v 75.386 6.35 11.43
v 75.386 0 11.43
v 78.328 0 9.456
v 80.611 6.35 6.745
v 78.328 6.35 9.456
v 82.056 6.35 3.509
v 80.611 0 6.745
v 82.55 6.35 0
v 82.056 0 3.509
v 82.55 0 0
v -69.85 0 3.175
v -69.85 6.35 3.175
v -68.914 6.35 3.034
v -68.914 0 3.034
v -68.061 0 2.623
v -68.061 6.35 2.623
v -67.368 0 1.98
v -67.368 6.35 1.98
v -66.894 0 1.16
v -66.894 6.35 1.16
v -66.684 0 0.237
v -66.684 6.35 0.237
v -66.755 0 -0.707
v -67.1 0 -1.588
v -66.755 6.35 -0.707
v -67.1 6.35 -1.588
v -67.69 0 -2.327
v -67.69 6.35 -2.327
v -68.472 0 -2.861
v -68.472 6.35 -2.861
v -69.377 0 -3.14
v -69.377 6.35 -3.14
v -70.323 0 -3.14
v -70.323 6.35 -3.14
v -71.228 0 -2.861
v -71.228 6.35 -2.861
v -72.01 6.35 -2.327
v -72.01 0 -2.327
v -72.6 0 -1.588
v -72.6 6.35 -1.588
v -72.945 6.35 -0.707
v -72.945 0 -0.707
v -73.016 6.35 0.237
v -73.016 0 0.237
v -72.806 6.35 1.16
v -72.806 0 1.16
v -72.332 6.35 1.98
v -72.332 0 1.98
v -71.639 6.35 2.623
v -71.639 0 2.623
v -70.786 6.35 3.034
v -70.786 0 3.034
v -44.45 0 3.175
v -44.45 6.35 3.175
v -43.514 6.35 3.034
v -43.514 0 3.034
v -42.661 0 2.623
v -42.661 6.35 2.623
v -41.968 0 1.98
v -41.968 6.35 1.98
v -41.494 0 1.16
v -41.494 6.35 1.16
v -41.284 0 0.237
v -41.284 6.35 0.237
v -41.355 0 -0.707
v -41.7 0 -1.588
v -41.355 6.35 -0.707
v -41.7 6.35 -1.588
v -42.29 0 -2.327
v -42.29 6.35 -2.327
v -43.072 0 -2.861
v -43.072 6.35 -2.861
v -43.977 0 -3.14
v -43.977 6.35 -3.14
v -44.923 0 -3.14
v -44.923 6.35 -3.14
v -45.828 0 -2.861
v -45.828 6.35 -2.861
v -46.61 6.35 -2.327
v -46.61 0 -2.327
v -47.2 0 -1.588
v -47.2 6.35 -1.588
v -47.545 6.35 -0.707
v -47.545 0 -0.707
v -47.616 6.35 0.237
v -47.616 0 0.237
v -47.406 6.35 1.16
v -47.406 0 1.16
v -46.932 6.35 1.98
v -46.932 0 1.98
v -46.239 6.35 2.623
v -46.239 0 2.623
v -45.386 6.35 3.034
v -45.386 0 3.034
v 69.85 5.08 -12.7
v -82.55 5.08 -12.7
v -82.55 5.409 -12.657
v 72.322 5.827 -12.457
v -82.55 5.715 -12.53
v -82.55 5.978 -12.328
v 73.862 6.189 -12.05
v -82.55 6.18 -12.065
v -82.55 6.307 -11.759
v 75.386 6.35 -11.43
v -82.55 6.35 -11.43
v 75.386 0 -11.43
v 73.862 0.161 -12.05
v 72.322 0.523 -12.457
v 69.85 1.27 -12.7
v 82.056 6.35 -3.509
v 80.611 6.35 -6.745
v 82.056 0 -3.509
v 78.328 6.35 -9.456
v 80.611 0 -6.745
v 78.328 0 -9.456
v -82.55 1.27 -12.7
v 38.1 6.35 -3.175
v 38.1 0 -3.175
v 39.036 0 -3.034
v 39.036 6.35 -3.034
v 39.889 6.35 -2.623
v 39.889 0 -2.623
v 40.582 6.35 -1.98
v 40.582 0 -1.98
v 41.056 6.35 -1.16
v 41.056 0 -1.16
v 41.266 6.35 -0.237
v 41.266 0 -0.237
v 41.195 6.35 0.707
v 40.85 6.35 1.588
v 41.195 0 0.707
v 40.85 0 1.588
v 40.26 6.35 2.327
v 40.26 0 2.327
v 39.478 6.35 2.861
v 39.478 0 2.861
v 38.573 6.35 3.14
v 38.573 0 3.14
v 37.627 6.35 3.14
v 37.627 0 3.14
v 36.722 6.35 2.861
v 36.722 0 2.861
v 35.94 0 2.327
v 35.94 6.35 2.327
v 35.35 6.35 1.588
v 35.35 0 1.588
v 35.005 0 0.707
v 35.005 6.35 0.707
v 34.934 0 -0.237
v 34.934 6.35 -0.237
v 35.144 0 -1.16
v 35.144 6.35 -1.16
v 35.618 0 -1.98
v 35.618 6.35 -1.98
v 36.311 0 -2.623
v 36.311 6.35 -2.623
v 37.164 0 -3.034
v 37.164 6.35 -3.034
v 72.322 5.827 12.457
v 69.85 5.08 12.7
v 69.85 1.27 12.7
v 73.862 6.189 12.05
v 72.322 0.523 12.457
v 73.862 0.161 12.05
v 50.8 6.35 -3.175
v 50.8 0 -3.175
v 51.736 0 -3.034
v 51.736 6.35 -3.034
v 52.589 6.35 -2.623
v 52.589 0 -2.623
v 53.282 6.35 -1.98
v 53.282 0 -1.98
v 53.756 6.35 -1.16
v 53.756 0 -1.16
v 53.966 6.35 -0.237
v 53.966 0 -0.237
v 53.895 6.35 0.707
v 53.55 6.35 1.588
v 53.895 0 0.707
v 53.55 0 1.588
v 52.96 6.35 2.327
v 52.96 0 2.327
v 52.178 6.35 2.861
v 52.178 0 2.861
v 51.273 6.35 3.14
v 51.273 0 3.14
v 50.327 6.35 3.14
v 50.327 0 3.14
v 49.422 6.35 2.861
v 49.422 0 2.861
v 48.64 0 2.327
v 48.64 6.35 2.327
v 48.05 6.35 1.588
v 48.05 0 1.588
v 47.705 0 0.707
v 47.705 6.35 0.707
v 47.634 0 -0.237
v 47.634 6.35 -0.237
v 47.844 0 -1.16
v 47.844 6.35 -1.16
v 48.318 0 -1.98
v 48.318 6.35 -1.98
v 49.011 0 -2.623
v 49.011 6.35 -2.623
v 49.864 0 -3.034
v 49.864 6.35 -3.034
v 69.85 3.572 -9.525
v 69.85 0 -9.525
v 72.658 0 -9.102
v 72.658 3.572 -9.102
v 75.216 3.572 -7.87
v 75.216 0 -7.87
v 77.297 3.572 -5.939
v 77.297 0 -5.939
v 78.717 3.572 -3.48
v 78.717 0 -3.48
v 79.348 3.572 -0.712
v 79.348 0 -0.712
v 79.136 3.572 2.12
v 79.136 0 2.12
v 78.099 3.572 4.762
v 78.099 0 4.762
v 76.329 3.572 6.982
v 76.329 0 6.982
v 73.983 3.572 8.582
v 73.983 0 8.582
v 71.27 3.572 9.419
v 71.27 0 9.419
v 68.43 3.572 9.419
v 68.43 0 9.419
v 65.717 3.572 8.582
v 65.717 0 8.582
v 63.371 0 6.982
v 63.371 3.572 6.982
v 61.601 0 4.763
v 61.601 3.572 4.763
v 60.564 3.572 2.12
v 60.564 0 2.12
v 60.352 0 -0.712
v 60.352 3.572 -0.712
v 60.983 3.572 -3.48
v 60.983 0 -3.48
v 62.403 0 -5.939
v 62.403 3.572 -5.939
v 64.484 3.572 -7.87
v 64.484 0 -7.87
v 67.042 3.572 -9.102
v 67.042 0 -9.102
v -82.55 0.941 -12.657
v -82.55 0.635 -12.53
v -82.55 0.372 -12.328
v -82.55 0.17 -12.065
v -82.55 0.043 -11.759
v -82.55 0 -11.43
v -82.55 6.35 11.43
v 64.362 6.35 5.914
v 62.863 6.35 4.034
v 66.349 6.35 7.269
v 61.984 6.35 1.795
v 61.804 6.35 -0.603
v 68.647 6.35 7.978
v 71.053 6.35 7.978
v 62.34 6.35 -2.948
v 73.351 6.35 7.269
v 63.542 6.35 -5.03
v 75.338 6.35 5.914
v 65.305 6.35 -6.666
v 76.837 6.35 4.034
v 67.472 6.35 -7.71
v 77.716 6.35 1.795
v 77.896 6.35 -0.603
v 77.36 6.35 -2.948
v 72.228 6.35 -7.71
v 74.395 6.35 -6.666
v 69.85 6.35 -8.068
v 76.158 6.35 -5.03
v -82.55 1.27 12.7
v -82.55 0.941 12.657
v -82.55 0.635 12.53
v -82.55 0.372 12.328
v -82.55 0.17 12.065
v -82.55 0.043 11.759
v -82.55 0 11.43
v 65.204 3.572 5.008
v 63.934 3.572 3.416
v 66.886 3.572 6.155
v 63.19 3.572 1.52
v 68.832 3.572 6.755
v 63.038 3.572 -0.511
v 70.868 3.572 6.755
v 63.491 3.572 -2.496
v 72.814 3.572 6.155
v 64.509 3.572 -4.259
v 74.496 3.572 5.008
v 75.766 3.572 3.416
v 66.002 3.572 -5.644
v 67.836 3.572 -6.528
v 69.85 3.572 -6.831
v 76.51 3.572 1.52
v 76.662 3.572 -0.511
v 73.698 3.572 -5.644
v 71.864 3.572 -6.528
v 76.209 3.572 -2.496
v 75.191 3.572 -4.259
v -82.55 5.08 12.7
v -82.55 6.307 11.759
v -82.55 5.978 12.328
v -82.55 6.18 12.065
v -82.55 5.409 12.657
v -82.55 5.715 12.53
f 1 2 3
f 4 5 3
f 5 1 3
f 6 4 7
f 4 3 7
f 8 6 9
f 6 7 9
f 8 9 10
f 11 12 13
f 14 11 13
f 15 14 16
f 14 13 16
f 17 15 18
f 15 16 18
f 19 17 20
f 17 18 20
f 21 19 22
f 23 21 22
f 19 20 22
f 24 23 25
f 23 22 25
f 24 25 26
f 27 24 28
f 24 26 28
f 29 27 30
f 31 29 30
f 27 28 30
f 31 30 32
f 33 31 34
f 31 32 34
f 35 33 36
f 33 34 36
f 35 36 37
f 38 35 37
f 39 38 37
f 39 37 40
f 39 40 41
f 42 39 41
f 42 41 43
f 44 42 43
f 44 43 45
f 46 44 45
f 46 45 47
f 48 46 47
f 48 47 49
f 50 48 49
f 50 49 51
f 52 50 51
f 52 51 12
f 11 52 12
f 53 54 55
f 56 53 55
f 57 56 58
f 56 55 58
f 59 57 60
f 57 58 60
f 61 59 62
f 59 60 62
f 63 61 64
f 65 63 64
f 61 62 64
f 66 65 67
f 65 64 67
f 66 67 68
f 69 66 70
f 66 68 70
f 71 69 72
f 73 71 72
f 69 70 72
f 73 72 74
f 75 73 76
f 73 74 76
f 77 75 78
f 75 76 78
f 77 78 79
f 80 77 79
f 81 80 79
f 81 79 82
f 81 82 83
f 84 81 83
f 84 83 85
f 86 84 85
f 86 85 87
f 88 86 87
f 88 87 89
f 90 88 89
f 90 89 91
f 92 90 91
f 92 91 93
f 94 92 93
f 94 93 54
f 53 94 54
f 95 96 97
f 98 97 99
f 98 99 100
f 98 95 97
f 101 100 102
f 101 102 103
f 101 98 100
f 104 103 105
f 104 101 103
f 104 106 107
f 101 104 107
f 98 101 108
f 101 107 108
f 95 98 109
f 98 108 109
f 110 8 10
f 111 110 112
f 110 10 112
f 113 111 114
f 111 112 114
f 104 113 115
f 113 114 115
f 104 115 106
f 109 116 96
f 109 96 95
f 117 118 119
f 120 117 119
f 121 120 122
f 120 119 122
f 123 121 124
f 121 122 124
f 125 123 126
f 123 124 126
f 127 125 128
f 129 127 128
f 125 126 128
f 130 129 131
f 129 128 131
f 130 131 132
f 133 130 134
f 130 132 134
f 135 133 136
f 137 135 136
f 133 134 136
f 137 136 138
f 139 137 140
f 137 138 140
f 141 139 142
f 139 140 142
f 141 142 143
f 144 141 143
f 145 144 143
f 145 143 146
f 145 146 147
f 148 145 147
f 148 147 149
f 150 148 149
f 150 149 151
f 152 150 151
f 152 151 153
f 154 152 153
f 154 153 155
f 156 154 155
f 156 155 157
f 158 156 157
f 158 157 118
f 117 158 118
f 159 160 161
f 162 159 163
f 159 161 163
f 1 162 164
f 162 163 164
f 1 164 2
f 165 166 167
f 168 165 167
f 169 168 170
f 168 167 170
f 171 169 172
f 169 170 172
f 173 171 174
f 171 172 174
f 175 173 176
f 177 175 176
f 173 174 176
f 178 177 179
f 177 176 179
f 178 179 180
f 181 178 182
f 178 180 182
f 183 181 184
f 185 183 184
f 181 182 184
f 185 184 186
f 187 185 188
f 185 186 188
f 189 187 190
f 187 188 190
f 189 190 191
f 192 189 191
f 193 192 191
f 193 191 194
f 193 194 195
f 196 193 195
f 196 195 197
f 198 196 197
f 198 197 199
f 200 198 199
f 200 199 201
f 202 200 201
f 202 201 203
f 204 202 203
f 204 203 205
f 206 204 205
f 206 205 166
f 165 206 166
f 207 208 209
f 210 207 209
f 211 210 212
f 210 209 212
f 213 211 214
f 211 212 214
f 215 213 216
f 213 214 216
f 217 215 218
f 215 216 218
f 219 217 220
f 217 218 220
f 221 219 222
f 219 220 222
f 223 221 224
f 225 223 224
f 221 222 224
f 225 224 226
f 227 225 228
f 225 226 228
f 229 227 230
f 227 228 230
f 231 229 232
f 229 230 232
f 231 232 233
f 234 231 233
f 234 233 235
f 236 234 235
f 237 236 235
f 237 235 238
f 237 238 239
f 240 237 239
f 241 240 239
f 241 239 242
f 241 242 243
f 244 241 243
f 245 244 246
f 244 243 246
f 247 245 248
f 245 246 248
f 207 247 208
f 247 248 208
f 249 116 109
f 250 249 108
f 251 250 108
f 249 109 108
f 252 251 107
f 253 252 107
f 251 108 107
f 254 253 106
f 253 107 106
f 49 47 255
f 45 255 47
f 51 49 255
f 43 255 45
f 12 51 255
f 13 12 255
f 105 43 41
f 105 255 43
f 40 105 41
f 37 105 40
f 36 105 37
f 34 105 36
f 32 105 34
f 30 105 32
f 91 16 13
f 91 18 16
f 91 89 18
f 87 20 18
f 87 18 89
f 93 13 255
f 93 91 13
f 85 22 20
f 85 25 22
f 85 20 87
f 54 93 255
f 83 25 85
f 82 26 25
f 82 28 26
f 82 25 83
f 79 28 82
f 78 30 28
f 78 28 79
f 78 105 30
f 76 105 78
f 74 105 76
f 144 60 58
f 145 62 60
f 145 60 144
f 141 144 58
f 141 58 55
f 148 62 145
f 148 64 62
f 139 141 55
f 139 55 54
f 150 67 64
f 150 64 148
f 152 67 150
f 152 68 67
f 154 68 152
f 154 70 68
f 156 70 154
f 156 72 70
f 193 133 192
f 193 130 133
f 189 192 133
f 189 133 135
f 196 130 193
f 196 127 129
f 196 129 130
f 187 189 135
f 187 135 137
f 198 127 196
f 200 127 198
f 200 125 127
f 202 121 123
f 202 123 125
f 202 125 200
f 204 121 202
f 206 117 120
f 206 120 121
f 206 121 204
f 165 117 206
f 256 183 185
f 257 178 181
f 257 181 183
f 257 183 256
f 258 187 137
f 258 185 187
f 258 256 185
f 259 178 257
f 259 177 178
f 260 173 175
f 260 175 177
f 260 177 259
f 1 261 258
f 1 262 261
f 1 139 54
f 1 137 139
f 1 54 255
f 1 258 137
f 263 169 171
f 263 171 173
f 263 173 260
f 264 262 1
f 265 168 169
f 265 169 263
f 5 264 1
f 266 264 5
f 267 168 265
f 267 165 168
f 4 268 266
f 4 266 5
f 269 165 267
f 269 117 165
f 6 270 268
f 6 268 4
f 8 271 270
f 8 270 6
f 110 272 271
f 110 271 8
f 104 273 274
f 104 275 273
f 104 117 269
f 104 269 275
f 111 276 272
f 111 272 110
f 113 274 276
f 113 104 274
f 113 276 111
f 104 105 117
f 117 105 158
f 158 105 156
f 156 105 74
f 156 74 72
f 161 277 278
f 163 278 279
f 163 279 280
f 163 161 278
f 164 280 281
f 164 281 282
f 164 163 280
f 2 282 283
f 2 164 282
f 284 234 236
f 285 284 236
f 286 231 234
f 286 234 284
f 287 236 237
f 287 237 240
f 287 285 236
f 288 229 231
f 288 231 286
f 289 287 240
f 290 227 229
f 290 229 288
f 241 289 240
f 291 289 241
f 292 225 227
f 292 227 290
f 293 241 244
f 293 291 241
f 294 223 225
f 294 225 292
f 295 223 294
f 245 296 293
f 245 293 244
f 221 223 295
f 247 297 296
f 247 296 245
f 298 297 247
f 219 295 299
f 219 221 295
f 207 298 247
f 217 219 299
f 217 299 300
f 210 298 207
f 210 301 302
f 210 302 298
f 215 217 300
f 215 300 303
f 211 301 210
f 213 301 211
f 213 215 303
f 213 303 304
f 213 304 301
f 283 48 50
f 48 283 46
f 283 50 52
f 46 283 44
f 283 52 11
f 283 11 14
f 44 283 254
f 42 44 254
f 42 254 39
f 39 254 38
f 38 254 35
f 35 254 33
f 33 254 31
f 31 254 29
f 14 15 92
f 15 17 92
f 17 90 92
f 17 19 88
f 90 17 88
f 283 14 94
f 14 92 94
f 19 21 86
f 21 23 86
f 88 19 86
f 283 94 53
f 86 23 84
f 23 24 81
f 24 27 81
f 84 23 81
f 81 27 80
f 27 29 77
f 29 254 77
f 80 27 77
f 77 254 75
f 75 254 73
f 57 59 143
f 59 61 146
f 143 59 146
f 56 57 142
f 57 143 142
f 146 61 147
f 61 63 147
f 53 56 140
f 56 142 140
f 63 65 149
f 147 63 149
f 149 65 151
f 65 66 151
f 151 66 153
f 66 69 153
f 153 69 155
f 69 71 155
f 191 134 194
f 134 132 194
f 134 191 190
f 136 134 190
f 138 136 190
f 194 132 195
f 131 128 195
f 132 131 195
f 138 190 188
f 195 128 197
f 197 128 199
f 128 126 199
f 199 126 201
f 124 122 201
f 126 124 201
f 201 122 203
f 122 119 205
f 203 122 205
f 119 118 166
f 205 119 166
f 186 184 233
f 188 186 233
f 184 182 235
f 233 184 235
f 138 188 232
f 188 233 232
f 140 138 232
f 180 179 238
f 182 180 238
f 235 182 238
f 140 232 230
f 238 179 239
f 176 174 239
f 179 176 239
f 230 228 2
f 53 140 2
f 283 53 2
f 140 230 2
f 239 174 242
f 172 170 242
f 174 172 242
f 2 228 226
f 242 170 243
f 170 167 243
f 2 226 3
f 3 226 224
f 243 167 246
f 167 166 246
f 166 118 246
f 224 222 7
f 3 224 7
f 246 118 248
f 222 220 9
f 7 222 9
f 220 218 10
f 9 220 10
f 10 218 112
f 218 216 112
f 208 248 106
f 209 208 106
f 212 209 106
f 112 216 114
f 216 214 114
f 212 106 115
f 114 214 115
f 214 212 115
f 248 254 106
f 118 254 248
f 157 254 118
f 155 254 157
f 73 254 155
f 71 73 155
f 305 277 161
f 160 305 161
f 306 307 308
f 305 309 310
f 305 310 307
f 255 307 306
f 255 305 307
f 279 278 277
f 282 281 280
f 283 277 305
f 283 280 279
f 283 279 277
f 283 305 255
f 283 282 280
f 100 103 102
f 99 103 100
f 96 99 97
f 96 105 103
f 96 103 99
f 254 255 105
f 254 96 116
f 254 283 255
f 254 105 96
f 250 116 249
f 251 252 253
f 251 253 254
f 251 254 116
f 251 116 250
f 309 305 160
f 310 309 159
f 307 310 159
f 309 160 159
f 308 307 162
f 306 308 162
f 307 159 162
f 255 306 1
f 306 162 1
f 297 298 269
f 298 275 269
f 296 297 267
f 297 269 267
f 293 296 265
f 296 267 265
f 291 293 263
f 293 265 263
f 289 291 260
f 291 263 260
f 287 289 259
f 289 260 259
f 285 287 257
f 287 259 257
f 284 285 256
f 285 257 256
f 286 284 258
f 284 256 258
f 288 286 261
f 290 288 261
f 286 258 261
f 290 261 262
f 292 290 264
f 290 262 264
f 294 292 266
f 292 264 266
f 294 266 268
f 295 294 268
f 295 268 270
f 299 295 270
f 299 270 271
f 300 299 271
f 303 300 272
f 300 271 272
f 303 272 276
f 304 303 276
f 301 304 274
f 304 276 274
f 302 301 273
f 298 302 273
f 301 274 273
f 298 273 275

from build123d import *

# Parameters (mm, degrees)
SKETCH1_W           = 165.1
SKETCH1_H           = 25.4
BOSS_EXTRUDE1_DEPTH = 6.35
FILLET1_R           = 1.27
SKETCH2_R           = 3.175
SKETCH2_R_2         = 6.35
CUT_EXTRUDE1_DEPTH  = 84.762252835
SKETCH3_R           = 9.525
CUT_EXTRUDE2_DEPTH  = 3.571875
CUT_EXTRUDE3_DEPTH  = 84.762252835
SKETCH5_R           = 3.175
CUT_EXTRUDE4_DEPTH  = 84.762252956


with BuildPart() as part:
    # Sketch1 → Boss-Extrude1 (new body)
    with BuildSketch(Plane(origin=(0, 0, 0), x_dir=(1, 0, 0), z_dir=(0, 1, 0))):
        Rectangle(SKETCH1_W, SKETCH1_H)
    extrude(amount=BOSS_EXTRUDE1_DEPTH)

    # Fillet1
    fillet1_edges = [part.edges().sort_by_distance(p)[0] for p in [
        (0, 0, -12.7),
        (0, 6.35, -12.7),
        (0, 0, 12.7),
        (0, 6.35, 12.7),
    ]]
    fillet(fillet1_edges, radius=FILLET1_R)

    # Sketch2 → Cut-Extrude1 (cut, through all)
    with BuildSketch(Plane(origin=(0, 6.35, 0), x_dir=(1, 0, 0), z_dir=(0, 1, 0))):
        with Locations((-69.85, 0)):
            Circle(SKETCH2_R)
        with Locations((69.85, 0)):
            Circle(SKETCH2_R_2)
        with Locations((-44.45, 0)):
            Circle(SKETCH2_R)
    extrude(amount=-CUT_EXTRUDE1_DEPTH, mode=Mode.SUBTRACT)

    # Sketch3 → Cut-Extrude2 (cut)
    with BuildSketch(Plane.XZ):
        with Locations((69.85, 0)):
            Circle(SKETCH3_R)
    extrude(amount=-CUT_EXTRUDE2_DEPTH, mode=Mode.SUBTRACT)

    # Sketch4 → Cut-Extrude3 (cut, through all)
    with BuildSketch(Plane.XZ):
        with BuildLine():
            Line((69.85, -12.7), (82.55, -12.7))
            Line((82.55, -12.7), (82.55, 0))
            ThreePointArc((82.55, 0), (78.830256121, -8.980256121), (69.85, -12.7))
        make_face()
        with BuildLine():
            Line((82.55, 0), (82.55, 12.7))
            Line((82.55, 12.7), (69.85, 12.7))
            ThreePointArc((69.85, 12.7), (78.830256121, 8.980256121), (82.55, 0))
        make_face()
    extrude(amount=-CUT_EXTRUDE3_DEPTH, mode=Mode.SUBTRACT)

    # Sketch5 → Cut-Extrude4 (cut, through all)
    with BuildSketch(Plane.XZ):
        with Locations((50.8, 0)):
            Circle(SKETCH5_R)
        with Locations((38.1, 0)):
            Circle(SKETCH5_R)
    extrude(amount=-CUT_EXTRUDE4_DEPTH, mode=Mode.SUBTRACT)

    # Sketch8 → Cut-Revolve1 (revolve, cut)
    with BuildSketch(Plane.XY):
        Polygon((77.91821119, 6.35), (76.2, 6.35), (76.2, 3.571875), (76.681310248, 3.571875), align=None)
    revolve(axis=Axis((69.85, 3.571875, 0), (0, 1, 0)), mode=Mode.SUBTRACT)


solid = part.part
